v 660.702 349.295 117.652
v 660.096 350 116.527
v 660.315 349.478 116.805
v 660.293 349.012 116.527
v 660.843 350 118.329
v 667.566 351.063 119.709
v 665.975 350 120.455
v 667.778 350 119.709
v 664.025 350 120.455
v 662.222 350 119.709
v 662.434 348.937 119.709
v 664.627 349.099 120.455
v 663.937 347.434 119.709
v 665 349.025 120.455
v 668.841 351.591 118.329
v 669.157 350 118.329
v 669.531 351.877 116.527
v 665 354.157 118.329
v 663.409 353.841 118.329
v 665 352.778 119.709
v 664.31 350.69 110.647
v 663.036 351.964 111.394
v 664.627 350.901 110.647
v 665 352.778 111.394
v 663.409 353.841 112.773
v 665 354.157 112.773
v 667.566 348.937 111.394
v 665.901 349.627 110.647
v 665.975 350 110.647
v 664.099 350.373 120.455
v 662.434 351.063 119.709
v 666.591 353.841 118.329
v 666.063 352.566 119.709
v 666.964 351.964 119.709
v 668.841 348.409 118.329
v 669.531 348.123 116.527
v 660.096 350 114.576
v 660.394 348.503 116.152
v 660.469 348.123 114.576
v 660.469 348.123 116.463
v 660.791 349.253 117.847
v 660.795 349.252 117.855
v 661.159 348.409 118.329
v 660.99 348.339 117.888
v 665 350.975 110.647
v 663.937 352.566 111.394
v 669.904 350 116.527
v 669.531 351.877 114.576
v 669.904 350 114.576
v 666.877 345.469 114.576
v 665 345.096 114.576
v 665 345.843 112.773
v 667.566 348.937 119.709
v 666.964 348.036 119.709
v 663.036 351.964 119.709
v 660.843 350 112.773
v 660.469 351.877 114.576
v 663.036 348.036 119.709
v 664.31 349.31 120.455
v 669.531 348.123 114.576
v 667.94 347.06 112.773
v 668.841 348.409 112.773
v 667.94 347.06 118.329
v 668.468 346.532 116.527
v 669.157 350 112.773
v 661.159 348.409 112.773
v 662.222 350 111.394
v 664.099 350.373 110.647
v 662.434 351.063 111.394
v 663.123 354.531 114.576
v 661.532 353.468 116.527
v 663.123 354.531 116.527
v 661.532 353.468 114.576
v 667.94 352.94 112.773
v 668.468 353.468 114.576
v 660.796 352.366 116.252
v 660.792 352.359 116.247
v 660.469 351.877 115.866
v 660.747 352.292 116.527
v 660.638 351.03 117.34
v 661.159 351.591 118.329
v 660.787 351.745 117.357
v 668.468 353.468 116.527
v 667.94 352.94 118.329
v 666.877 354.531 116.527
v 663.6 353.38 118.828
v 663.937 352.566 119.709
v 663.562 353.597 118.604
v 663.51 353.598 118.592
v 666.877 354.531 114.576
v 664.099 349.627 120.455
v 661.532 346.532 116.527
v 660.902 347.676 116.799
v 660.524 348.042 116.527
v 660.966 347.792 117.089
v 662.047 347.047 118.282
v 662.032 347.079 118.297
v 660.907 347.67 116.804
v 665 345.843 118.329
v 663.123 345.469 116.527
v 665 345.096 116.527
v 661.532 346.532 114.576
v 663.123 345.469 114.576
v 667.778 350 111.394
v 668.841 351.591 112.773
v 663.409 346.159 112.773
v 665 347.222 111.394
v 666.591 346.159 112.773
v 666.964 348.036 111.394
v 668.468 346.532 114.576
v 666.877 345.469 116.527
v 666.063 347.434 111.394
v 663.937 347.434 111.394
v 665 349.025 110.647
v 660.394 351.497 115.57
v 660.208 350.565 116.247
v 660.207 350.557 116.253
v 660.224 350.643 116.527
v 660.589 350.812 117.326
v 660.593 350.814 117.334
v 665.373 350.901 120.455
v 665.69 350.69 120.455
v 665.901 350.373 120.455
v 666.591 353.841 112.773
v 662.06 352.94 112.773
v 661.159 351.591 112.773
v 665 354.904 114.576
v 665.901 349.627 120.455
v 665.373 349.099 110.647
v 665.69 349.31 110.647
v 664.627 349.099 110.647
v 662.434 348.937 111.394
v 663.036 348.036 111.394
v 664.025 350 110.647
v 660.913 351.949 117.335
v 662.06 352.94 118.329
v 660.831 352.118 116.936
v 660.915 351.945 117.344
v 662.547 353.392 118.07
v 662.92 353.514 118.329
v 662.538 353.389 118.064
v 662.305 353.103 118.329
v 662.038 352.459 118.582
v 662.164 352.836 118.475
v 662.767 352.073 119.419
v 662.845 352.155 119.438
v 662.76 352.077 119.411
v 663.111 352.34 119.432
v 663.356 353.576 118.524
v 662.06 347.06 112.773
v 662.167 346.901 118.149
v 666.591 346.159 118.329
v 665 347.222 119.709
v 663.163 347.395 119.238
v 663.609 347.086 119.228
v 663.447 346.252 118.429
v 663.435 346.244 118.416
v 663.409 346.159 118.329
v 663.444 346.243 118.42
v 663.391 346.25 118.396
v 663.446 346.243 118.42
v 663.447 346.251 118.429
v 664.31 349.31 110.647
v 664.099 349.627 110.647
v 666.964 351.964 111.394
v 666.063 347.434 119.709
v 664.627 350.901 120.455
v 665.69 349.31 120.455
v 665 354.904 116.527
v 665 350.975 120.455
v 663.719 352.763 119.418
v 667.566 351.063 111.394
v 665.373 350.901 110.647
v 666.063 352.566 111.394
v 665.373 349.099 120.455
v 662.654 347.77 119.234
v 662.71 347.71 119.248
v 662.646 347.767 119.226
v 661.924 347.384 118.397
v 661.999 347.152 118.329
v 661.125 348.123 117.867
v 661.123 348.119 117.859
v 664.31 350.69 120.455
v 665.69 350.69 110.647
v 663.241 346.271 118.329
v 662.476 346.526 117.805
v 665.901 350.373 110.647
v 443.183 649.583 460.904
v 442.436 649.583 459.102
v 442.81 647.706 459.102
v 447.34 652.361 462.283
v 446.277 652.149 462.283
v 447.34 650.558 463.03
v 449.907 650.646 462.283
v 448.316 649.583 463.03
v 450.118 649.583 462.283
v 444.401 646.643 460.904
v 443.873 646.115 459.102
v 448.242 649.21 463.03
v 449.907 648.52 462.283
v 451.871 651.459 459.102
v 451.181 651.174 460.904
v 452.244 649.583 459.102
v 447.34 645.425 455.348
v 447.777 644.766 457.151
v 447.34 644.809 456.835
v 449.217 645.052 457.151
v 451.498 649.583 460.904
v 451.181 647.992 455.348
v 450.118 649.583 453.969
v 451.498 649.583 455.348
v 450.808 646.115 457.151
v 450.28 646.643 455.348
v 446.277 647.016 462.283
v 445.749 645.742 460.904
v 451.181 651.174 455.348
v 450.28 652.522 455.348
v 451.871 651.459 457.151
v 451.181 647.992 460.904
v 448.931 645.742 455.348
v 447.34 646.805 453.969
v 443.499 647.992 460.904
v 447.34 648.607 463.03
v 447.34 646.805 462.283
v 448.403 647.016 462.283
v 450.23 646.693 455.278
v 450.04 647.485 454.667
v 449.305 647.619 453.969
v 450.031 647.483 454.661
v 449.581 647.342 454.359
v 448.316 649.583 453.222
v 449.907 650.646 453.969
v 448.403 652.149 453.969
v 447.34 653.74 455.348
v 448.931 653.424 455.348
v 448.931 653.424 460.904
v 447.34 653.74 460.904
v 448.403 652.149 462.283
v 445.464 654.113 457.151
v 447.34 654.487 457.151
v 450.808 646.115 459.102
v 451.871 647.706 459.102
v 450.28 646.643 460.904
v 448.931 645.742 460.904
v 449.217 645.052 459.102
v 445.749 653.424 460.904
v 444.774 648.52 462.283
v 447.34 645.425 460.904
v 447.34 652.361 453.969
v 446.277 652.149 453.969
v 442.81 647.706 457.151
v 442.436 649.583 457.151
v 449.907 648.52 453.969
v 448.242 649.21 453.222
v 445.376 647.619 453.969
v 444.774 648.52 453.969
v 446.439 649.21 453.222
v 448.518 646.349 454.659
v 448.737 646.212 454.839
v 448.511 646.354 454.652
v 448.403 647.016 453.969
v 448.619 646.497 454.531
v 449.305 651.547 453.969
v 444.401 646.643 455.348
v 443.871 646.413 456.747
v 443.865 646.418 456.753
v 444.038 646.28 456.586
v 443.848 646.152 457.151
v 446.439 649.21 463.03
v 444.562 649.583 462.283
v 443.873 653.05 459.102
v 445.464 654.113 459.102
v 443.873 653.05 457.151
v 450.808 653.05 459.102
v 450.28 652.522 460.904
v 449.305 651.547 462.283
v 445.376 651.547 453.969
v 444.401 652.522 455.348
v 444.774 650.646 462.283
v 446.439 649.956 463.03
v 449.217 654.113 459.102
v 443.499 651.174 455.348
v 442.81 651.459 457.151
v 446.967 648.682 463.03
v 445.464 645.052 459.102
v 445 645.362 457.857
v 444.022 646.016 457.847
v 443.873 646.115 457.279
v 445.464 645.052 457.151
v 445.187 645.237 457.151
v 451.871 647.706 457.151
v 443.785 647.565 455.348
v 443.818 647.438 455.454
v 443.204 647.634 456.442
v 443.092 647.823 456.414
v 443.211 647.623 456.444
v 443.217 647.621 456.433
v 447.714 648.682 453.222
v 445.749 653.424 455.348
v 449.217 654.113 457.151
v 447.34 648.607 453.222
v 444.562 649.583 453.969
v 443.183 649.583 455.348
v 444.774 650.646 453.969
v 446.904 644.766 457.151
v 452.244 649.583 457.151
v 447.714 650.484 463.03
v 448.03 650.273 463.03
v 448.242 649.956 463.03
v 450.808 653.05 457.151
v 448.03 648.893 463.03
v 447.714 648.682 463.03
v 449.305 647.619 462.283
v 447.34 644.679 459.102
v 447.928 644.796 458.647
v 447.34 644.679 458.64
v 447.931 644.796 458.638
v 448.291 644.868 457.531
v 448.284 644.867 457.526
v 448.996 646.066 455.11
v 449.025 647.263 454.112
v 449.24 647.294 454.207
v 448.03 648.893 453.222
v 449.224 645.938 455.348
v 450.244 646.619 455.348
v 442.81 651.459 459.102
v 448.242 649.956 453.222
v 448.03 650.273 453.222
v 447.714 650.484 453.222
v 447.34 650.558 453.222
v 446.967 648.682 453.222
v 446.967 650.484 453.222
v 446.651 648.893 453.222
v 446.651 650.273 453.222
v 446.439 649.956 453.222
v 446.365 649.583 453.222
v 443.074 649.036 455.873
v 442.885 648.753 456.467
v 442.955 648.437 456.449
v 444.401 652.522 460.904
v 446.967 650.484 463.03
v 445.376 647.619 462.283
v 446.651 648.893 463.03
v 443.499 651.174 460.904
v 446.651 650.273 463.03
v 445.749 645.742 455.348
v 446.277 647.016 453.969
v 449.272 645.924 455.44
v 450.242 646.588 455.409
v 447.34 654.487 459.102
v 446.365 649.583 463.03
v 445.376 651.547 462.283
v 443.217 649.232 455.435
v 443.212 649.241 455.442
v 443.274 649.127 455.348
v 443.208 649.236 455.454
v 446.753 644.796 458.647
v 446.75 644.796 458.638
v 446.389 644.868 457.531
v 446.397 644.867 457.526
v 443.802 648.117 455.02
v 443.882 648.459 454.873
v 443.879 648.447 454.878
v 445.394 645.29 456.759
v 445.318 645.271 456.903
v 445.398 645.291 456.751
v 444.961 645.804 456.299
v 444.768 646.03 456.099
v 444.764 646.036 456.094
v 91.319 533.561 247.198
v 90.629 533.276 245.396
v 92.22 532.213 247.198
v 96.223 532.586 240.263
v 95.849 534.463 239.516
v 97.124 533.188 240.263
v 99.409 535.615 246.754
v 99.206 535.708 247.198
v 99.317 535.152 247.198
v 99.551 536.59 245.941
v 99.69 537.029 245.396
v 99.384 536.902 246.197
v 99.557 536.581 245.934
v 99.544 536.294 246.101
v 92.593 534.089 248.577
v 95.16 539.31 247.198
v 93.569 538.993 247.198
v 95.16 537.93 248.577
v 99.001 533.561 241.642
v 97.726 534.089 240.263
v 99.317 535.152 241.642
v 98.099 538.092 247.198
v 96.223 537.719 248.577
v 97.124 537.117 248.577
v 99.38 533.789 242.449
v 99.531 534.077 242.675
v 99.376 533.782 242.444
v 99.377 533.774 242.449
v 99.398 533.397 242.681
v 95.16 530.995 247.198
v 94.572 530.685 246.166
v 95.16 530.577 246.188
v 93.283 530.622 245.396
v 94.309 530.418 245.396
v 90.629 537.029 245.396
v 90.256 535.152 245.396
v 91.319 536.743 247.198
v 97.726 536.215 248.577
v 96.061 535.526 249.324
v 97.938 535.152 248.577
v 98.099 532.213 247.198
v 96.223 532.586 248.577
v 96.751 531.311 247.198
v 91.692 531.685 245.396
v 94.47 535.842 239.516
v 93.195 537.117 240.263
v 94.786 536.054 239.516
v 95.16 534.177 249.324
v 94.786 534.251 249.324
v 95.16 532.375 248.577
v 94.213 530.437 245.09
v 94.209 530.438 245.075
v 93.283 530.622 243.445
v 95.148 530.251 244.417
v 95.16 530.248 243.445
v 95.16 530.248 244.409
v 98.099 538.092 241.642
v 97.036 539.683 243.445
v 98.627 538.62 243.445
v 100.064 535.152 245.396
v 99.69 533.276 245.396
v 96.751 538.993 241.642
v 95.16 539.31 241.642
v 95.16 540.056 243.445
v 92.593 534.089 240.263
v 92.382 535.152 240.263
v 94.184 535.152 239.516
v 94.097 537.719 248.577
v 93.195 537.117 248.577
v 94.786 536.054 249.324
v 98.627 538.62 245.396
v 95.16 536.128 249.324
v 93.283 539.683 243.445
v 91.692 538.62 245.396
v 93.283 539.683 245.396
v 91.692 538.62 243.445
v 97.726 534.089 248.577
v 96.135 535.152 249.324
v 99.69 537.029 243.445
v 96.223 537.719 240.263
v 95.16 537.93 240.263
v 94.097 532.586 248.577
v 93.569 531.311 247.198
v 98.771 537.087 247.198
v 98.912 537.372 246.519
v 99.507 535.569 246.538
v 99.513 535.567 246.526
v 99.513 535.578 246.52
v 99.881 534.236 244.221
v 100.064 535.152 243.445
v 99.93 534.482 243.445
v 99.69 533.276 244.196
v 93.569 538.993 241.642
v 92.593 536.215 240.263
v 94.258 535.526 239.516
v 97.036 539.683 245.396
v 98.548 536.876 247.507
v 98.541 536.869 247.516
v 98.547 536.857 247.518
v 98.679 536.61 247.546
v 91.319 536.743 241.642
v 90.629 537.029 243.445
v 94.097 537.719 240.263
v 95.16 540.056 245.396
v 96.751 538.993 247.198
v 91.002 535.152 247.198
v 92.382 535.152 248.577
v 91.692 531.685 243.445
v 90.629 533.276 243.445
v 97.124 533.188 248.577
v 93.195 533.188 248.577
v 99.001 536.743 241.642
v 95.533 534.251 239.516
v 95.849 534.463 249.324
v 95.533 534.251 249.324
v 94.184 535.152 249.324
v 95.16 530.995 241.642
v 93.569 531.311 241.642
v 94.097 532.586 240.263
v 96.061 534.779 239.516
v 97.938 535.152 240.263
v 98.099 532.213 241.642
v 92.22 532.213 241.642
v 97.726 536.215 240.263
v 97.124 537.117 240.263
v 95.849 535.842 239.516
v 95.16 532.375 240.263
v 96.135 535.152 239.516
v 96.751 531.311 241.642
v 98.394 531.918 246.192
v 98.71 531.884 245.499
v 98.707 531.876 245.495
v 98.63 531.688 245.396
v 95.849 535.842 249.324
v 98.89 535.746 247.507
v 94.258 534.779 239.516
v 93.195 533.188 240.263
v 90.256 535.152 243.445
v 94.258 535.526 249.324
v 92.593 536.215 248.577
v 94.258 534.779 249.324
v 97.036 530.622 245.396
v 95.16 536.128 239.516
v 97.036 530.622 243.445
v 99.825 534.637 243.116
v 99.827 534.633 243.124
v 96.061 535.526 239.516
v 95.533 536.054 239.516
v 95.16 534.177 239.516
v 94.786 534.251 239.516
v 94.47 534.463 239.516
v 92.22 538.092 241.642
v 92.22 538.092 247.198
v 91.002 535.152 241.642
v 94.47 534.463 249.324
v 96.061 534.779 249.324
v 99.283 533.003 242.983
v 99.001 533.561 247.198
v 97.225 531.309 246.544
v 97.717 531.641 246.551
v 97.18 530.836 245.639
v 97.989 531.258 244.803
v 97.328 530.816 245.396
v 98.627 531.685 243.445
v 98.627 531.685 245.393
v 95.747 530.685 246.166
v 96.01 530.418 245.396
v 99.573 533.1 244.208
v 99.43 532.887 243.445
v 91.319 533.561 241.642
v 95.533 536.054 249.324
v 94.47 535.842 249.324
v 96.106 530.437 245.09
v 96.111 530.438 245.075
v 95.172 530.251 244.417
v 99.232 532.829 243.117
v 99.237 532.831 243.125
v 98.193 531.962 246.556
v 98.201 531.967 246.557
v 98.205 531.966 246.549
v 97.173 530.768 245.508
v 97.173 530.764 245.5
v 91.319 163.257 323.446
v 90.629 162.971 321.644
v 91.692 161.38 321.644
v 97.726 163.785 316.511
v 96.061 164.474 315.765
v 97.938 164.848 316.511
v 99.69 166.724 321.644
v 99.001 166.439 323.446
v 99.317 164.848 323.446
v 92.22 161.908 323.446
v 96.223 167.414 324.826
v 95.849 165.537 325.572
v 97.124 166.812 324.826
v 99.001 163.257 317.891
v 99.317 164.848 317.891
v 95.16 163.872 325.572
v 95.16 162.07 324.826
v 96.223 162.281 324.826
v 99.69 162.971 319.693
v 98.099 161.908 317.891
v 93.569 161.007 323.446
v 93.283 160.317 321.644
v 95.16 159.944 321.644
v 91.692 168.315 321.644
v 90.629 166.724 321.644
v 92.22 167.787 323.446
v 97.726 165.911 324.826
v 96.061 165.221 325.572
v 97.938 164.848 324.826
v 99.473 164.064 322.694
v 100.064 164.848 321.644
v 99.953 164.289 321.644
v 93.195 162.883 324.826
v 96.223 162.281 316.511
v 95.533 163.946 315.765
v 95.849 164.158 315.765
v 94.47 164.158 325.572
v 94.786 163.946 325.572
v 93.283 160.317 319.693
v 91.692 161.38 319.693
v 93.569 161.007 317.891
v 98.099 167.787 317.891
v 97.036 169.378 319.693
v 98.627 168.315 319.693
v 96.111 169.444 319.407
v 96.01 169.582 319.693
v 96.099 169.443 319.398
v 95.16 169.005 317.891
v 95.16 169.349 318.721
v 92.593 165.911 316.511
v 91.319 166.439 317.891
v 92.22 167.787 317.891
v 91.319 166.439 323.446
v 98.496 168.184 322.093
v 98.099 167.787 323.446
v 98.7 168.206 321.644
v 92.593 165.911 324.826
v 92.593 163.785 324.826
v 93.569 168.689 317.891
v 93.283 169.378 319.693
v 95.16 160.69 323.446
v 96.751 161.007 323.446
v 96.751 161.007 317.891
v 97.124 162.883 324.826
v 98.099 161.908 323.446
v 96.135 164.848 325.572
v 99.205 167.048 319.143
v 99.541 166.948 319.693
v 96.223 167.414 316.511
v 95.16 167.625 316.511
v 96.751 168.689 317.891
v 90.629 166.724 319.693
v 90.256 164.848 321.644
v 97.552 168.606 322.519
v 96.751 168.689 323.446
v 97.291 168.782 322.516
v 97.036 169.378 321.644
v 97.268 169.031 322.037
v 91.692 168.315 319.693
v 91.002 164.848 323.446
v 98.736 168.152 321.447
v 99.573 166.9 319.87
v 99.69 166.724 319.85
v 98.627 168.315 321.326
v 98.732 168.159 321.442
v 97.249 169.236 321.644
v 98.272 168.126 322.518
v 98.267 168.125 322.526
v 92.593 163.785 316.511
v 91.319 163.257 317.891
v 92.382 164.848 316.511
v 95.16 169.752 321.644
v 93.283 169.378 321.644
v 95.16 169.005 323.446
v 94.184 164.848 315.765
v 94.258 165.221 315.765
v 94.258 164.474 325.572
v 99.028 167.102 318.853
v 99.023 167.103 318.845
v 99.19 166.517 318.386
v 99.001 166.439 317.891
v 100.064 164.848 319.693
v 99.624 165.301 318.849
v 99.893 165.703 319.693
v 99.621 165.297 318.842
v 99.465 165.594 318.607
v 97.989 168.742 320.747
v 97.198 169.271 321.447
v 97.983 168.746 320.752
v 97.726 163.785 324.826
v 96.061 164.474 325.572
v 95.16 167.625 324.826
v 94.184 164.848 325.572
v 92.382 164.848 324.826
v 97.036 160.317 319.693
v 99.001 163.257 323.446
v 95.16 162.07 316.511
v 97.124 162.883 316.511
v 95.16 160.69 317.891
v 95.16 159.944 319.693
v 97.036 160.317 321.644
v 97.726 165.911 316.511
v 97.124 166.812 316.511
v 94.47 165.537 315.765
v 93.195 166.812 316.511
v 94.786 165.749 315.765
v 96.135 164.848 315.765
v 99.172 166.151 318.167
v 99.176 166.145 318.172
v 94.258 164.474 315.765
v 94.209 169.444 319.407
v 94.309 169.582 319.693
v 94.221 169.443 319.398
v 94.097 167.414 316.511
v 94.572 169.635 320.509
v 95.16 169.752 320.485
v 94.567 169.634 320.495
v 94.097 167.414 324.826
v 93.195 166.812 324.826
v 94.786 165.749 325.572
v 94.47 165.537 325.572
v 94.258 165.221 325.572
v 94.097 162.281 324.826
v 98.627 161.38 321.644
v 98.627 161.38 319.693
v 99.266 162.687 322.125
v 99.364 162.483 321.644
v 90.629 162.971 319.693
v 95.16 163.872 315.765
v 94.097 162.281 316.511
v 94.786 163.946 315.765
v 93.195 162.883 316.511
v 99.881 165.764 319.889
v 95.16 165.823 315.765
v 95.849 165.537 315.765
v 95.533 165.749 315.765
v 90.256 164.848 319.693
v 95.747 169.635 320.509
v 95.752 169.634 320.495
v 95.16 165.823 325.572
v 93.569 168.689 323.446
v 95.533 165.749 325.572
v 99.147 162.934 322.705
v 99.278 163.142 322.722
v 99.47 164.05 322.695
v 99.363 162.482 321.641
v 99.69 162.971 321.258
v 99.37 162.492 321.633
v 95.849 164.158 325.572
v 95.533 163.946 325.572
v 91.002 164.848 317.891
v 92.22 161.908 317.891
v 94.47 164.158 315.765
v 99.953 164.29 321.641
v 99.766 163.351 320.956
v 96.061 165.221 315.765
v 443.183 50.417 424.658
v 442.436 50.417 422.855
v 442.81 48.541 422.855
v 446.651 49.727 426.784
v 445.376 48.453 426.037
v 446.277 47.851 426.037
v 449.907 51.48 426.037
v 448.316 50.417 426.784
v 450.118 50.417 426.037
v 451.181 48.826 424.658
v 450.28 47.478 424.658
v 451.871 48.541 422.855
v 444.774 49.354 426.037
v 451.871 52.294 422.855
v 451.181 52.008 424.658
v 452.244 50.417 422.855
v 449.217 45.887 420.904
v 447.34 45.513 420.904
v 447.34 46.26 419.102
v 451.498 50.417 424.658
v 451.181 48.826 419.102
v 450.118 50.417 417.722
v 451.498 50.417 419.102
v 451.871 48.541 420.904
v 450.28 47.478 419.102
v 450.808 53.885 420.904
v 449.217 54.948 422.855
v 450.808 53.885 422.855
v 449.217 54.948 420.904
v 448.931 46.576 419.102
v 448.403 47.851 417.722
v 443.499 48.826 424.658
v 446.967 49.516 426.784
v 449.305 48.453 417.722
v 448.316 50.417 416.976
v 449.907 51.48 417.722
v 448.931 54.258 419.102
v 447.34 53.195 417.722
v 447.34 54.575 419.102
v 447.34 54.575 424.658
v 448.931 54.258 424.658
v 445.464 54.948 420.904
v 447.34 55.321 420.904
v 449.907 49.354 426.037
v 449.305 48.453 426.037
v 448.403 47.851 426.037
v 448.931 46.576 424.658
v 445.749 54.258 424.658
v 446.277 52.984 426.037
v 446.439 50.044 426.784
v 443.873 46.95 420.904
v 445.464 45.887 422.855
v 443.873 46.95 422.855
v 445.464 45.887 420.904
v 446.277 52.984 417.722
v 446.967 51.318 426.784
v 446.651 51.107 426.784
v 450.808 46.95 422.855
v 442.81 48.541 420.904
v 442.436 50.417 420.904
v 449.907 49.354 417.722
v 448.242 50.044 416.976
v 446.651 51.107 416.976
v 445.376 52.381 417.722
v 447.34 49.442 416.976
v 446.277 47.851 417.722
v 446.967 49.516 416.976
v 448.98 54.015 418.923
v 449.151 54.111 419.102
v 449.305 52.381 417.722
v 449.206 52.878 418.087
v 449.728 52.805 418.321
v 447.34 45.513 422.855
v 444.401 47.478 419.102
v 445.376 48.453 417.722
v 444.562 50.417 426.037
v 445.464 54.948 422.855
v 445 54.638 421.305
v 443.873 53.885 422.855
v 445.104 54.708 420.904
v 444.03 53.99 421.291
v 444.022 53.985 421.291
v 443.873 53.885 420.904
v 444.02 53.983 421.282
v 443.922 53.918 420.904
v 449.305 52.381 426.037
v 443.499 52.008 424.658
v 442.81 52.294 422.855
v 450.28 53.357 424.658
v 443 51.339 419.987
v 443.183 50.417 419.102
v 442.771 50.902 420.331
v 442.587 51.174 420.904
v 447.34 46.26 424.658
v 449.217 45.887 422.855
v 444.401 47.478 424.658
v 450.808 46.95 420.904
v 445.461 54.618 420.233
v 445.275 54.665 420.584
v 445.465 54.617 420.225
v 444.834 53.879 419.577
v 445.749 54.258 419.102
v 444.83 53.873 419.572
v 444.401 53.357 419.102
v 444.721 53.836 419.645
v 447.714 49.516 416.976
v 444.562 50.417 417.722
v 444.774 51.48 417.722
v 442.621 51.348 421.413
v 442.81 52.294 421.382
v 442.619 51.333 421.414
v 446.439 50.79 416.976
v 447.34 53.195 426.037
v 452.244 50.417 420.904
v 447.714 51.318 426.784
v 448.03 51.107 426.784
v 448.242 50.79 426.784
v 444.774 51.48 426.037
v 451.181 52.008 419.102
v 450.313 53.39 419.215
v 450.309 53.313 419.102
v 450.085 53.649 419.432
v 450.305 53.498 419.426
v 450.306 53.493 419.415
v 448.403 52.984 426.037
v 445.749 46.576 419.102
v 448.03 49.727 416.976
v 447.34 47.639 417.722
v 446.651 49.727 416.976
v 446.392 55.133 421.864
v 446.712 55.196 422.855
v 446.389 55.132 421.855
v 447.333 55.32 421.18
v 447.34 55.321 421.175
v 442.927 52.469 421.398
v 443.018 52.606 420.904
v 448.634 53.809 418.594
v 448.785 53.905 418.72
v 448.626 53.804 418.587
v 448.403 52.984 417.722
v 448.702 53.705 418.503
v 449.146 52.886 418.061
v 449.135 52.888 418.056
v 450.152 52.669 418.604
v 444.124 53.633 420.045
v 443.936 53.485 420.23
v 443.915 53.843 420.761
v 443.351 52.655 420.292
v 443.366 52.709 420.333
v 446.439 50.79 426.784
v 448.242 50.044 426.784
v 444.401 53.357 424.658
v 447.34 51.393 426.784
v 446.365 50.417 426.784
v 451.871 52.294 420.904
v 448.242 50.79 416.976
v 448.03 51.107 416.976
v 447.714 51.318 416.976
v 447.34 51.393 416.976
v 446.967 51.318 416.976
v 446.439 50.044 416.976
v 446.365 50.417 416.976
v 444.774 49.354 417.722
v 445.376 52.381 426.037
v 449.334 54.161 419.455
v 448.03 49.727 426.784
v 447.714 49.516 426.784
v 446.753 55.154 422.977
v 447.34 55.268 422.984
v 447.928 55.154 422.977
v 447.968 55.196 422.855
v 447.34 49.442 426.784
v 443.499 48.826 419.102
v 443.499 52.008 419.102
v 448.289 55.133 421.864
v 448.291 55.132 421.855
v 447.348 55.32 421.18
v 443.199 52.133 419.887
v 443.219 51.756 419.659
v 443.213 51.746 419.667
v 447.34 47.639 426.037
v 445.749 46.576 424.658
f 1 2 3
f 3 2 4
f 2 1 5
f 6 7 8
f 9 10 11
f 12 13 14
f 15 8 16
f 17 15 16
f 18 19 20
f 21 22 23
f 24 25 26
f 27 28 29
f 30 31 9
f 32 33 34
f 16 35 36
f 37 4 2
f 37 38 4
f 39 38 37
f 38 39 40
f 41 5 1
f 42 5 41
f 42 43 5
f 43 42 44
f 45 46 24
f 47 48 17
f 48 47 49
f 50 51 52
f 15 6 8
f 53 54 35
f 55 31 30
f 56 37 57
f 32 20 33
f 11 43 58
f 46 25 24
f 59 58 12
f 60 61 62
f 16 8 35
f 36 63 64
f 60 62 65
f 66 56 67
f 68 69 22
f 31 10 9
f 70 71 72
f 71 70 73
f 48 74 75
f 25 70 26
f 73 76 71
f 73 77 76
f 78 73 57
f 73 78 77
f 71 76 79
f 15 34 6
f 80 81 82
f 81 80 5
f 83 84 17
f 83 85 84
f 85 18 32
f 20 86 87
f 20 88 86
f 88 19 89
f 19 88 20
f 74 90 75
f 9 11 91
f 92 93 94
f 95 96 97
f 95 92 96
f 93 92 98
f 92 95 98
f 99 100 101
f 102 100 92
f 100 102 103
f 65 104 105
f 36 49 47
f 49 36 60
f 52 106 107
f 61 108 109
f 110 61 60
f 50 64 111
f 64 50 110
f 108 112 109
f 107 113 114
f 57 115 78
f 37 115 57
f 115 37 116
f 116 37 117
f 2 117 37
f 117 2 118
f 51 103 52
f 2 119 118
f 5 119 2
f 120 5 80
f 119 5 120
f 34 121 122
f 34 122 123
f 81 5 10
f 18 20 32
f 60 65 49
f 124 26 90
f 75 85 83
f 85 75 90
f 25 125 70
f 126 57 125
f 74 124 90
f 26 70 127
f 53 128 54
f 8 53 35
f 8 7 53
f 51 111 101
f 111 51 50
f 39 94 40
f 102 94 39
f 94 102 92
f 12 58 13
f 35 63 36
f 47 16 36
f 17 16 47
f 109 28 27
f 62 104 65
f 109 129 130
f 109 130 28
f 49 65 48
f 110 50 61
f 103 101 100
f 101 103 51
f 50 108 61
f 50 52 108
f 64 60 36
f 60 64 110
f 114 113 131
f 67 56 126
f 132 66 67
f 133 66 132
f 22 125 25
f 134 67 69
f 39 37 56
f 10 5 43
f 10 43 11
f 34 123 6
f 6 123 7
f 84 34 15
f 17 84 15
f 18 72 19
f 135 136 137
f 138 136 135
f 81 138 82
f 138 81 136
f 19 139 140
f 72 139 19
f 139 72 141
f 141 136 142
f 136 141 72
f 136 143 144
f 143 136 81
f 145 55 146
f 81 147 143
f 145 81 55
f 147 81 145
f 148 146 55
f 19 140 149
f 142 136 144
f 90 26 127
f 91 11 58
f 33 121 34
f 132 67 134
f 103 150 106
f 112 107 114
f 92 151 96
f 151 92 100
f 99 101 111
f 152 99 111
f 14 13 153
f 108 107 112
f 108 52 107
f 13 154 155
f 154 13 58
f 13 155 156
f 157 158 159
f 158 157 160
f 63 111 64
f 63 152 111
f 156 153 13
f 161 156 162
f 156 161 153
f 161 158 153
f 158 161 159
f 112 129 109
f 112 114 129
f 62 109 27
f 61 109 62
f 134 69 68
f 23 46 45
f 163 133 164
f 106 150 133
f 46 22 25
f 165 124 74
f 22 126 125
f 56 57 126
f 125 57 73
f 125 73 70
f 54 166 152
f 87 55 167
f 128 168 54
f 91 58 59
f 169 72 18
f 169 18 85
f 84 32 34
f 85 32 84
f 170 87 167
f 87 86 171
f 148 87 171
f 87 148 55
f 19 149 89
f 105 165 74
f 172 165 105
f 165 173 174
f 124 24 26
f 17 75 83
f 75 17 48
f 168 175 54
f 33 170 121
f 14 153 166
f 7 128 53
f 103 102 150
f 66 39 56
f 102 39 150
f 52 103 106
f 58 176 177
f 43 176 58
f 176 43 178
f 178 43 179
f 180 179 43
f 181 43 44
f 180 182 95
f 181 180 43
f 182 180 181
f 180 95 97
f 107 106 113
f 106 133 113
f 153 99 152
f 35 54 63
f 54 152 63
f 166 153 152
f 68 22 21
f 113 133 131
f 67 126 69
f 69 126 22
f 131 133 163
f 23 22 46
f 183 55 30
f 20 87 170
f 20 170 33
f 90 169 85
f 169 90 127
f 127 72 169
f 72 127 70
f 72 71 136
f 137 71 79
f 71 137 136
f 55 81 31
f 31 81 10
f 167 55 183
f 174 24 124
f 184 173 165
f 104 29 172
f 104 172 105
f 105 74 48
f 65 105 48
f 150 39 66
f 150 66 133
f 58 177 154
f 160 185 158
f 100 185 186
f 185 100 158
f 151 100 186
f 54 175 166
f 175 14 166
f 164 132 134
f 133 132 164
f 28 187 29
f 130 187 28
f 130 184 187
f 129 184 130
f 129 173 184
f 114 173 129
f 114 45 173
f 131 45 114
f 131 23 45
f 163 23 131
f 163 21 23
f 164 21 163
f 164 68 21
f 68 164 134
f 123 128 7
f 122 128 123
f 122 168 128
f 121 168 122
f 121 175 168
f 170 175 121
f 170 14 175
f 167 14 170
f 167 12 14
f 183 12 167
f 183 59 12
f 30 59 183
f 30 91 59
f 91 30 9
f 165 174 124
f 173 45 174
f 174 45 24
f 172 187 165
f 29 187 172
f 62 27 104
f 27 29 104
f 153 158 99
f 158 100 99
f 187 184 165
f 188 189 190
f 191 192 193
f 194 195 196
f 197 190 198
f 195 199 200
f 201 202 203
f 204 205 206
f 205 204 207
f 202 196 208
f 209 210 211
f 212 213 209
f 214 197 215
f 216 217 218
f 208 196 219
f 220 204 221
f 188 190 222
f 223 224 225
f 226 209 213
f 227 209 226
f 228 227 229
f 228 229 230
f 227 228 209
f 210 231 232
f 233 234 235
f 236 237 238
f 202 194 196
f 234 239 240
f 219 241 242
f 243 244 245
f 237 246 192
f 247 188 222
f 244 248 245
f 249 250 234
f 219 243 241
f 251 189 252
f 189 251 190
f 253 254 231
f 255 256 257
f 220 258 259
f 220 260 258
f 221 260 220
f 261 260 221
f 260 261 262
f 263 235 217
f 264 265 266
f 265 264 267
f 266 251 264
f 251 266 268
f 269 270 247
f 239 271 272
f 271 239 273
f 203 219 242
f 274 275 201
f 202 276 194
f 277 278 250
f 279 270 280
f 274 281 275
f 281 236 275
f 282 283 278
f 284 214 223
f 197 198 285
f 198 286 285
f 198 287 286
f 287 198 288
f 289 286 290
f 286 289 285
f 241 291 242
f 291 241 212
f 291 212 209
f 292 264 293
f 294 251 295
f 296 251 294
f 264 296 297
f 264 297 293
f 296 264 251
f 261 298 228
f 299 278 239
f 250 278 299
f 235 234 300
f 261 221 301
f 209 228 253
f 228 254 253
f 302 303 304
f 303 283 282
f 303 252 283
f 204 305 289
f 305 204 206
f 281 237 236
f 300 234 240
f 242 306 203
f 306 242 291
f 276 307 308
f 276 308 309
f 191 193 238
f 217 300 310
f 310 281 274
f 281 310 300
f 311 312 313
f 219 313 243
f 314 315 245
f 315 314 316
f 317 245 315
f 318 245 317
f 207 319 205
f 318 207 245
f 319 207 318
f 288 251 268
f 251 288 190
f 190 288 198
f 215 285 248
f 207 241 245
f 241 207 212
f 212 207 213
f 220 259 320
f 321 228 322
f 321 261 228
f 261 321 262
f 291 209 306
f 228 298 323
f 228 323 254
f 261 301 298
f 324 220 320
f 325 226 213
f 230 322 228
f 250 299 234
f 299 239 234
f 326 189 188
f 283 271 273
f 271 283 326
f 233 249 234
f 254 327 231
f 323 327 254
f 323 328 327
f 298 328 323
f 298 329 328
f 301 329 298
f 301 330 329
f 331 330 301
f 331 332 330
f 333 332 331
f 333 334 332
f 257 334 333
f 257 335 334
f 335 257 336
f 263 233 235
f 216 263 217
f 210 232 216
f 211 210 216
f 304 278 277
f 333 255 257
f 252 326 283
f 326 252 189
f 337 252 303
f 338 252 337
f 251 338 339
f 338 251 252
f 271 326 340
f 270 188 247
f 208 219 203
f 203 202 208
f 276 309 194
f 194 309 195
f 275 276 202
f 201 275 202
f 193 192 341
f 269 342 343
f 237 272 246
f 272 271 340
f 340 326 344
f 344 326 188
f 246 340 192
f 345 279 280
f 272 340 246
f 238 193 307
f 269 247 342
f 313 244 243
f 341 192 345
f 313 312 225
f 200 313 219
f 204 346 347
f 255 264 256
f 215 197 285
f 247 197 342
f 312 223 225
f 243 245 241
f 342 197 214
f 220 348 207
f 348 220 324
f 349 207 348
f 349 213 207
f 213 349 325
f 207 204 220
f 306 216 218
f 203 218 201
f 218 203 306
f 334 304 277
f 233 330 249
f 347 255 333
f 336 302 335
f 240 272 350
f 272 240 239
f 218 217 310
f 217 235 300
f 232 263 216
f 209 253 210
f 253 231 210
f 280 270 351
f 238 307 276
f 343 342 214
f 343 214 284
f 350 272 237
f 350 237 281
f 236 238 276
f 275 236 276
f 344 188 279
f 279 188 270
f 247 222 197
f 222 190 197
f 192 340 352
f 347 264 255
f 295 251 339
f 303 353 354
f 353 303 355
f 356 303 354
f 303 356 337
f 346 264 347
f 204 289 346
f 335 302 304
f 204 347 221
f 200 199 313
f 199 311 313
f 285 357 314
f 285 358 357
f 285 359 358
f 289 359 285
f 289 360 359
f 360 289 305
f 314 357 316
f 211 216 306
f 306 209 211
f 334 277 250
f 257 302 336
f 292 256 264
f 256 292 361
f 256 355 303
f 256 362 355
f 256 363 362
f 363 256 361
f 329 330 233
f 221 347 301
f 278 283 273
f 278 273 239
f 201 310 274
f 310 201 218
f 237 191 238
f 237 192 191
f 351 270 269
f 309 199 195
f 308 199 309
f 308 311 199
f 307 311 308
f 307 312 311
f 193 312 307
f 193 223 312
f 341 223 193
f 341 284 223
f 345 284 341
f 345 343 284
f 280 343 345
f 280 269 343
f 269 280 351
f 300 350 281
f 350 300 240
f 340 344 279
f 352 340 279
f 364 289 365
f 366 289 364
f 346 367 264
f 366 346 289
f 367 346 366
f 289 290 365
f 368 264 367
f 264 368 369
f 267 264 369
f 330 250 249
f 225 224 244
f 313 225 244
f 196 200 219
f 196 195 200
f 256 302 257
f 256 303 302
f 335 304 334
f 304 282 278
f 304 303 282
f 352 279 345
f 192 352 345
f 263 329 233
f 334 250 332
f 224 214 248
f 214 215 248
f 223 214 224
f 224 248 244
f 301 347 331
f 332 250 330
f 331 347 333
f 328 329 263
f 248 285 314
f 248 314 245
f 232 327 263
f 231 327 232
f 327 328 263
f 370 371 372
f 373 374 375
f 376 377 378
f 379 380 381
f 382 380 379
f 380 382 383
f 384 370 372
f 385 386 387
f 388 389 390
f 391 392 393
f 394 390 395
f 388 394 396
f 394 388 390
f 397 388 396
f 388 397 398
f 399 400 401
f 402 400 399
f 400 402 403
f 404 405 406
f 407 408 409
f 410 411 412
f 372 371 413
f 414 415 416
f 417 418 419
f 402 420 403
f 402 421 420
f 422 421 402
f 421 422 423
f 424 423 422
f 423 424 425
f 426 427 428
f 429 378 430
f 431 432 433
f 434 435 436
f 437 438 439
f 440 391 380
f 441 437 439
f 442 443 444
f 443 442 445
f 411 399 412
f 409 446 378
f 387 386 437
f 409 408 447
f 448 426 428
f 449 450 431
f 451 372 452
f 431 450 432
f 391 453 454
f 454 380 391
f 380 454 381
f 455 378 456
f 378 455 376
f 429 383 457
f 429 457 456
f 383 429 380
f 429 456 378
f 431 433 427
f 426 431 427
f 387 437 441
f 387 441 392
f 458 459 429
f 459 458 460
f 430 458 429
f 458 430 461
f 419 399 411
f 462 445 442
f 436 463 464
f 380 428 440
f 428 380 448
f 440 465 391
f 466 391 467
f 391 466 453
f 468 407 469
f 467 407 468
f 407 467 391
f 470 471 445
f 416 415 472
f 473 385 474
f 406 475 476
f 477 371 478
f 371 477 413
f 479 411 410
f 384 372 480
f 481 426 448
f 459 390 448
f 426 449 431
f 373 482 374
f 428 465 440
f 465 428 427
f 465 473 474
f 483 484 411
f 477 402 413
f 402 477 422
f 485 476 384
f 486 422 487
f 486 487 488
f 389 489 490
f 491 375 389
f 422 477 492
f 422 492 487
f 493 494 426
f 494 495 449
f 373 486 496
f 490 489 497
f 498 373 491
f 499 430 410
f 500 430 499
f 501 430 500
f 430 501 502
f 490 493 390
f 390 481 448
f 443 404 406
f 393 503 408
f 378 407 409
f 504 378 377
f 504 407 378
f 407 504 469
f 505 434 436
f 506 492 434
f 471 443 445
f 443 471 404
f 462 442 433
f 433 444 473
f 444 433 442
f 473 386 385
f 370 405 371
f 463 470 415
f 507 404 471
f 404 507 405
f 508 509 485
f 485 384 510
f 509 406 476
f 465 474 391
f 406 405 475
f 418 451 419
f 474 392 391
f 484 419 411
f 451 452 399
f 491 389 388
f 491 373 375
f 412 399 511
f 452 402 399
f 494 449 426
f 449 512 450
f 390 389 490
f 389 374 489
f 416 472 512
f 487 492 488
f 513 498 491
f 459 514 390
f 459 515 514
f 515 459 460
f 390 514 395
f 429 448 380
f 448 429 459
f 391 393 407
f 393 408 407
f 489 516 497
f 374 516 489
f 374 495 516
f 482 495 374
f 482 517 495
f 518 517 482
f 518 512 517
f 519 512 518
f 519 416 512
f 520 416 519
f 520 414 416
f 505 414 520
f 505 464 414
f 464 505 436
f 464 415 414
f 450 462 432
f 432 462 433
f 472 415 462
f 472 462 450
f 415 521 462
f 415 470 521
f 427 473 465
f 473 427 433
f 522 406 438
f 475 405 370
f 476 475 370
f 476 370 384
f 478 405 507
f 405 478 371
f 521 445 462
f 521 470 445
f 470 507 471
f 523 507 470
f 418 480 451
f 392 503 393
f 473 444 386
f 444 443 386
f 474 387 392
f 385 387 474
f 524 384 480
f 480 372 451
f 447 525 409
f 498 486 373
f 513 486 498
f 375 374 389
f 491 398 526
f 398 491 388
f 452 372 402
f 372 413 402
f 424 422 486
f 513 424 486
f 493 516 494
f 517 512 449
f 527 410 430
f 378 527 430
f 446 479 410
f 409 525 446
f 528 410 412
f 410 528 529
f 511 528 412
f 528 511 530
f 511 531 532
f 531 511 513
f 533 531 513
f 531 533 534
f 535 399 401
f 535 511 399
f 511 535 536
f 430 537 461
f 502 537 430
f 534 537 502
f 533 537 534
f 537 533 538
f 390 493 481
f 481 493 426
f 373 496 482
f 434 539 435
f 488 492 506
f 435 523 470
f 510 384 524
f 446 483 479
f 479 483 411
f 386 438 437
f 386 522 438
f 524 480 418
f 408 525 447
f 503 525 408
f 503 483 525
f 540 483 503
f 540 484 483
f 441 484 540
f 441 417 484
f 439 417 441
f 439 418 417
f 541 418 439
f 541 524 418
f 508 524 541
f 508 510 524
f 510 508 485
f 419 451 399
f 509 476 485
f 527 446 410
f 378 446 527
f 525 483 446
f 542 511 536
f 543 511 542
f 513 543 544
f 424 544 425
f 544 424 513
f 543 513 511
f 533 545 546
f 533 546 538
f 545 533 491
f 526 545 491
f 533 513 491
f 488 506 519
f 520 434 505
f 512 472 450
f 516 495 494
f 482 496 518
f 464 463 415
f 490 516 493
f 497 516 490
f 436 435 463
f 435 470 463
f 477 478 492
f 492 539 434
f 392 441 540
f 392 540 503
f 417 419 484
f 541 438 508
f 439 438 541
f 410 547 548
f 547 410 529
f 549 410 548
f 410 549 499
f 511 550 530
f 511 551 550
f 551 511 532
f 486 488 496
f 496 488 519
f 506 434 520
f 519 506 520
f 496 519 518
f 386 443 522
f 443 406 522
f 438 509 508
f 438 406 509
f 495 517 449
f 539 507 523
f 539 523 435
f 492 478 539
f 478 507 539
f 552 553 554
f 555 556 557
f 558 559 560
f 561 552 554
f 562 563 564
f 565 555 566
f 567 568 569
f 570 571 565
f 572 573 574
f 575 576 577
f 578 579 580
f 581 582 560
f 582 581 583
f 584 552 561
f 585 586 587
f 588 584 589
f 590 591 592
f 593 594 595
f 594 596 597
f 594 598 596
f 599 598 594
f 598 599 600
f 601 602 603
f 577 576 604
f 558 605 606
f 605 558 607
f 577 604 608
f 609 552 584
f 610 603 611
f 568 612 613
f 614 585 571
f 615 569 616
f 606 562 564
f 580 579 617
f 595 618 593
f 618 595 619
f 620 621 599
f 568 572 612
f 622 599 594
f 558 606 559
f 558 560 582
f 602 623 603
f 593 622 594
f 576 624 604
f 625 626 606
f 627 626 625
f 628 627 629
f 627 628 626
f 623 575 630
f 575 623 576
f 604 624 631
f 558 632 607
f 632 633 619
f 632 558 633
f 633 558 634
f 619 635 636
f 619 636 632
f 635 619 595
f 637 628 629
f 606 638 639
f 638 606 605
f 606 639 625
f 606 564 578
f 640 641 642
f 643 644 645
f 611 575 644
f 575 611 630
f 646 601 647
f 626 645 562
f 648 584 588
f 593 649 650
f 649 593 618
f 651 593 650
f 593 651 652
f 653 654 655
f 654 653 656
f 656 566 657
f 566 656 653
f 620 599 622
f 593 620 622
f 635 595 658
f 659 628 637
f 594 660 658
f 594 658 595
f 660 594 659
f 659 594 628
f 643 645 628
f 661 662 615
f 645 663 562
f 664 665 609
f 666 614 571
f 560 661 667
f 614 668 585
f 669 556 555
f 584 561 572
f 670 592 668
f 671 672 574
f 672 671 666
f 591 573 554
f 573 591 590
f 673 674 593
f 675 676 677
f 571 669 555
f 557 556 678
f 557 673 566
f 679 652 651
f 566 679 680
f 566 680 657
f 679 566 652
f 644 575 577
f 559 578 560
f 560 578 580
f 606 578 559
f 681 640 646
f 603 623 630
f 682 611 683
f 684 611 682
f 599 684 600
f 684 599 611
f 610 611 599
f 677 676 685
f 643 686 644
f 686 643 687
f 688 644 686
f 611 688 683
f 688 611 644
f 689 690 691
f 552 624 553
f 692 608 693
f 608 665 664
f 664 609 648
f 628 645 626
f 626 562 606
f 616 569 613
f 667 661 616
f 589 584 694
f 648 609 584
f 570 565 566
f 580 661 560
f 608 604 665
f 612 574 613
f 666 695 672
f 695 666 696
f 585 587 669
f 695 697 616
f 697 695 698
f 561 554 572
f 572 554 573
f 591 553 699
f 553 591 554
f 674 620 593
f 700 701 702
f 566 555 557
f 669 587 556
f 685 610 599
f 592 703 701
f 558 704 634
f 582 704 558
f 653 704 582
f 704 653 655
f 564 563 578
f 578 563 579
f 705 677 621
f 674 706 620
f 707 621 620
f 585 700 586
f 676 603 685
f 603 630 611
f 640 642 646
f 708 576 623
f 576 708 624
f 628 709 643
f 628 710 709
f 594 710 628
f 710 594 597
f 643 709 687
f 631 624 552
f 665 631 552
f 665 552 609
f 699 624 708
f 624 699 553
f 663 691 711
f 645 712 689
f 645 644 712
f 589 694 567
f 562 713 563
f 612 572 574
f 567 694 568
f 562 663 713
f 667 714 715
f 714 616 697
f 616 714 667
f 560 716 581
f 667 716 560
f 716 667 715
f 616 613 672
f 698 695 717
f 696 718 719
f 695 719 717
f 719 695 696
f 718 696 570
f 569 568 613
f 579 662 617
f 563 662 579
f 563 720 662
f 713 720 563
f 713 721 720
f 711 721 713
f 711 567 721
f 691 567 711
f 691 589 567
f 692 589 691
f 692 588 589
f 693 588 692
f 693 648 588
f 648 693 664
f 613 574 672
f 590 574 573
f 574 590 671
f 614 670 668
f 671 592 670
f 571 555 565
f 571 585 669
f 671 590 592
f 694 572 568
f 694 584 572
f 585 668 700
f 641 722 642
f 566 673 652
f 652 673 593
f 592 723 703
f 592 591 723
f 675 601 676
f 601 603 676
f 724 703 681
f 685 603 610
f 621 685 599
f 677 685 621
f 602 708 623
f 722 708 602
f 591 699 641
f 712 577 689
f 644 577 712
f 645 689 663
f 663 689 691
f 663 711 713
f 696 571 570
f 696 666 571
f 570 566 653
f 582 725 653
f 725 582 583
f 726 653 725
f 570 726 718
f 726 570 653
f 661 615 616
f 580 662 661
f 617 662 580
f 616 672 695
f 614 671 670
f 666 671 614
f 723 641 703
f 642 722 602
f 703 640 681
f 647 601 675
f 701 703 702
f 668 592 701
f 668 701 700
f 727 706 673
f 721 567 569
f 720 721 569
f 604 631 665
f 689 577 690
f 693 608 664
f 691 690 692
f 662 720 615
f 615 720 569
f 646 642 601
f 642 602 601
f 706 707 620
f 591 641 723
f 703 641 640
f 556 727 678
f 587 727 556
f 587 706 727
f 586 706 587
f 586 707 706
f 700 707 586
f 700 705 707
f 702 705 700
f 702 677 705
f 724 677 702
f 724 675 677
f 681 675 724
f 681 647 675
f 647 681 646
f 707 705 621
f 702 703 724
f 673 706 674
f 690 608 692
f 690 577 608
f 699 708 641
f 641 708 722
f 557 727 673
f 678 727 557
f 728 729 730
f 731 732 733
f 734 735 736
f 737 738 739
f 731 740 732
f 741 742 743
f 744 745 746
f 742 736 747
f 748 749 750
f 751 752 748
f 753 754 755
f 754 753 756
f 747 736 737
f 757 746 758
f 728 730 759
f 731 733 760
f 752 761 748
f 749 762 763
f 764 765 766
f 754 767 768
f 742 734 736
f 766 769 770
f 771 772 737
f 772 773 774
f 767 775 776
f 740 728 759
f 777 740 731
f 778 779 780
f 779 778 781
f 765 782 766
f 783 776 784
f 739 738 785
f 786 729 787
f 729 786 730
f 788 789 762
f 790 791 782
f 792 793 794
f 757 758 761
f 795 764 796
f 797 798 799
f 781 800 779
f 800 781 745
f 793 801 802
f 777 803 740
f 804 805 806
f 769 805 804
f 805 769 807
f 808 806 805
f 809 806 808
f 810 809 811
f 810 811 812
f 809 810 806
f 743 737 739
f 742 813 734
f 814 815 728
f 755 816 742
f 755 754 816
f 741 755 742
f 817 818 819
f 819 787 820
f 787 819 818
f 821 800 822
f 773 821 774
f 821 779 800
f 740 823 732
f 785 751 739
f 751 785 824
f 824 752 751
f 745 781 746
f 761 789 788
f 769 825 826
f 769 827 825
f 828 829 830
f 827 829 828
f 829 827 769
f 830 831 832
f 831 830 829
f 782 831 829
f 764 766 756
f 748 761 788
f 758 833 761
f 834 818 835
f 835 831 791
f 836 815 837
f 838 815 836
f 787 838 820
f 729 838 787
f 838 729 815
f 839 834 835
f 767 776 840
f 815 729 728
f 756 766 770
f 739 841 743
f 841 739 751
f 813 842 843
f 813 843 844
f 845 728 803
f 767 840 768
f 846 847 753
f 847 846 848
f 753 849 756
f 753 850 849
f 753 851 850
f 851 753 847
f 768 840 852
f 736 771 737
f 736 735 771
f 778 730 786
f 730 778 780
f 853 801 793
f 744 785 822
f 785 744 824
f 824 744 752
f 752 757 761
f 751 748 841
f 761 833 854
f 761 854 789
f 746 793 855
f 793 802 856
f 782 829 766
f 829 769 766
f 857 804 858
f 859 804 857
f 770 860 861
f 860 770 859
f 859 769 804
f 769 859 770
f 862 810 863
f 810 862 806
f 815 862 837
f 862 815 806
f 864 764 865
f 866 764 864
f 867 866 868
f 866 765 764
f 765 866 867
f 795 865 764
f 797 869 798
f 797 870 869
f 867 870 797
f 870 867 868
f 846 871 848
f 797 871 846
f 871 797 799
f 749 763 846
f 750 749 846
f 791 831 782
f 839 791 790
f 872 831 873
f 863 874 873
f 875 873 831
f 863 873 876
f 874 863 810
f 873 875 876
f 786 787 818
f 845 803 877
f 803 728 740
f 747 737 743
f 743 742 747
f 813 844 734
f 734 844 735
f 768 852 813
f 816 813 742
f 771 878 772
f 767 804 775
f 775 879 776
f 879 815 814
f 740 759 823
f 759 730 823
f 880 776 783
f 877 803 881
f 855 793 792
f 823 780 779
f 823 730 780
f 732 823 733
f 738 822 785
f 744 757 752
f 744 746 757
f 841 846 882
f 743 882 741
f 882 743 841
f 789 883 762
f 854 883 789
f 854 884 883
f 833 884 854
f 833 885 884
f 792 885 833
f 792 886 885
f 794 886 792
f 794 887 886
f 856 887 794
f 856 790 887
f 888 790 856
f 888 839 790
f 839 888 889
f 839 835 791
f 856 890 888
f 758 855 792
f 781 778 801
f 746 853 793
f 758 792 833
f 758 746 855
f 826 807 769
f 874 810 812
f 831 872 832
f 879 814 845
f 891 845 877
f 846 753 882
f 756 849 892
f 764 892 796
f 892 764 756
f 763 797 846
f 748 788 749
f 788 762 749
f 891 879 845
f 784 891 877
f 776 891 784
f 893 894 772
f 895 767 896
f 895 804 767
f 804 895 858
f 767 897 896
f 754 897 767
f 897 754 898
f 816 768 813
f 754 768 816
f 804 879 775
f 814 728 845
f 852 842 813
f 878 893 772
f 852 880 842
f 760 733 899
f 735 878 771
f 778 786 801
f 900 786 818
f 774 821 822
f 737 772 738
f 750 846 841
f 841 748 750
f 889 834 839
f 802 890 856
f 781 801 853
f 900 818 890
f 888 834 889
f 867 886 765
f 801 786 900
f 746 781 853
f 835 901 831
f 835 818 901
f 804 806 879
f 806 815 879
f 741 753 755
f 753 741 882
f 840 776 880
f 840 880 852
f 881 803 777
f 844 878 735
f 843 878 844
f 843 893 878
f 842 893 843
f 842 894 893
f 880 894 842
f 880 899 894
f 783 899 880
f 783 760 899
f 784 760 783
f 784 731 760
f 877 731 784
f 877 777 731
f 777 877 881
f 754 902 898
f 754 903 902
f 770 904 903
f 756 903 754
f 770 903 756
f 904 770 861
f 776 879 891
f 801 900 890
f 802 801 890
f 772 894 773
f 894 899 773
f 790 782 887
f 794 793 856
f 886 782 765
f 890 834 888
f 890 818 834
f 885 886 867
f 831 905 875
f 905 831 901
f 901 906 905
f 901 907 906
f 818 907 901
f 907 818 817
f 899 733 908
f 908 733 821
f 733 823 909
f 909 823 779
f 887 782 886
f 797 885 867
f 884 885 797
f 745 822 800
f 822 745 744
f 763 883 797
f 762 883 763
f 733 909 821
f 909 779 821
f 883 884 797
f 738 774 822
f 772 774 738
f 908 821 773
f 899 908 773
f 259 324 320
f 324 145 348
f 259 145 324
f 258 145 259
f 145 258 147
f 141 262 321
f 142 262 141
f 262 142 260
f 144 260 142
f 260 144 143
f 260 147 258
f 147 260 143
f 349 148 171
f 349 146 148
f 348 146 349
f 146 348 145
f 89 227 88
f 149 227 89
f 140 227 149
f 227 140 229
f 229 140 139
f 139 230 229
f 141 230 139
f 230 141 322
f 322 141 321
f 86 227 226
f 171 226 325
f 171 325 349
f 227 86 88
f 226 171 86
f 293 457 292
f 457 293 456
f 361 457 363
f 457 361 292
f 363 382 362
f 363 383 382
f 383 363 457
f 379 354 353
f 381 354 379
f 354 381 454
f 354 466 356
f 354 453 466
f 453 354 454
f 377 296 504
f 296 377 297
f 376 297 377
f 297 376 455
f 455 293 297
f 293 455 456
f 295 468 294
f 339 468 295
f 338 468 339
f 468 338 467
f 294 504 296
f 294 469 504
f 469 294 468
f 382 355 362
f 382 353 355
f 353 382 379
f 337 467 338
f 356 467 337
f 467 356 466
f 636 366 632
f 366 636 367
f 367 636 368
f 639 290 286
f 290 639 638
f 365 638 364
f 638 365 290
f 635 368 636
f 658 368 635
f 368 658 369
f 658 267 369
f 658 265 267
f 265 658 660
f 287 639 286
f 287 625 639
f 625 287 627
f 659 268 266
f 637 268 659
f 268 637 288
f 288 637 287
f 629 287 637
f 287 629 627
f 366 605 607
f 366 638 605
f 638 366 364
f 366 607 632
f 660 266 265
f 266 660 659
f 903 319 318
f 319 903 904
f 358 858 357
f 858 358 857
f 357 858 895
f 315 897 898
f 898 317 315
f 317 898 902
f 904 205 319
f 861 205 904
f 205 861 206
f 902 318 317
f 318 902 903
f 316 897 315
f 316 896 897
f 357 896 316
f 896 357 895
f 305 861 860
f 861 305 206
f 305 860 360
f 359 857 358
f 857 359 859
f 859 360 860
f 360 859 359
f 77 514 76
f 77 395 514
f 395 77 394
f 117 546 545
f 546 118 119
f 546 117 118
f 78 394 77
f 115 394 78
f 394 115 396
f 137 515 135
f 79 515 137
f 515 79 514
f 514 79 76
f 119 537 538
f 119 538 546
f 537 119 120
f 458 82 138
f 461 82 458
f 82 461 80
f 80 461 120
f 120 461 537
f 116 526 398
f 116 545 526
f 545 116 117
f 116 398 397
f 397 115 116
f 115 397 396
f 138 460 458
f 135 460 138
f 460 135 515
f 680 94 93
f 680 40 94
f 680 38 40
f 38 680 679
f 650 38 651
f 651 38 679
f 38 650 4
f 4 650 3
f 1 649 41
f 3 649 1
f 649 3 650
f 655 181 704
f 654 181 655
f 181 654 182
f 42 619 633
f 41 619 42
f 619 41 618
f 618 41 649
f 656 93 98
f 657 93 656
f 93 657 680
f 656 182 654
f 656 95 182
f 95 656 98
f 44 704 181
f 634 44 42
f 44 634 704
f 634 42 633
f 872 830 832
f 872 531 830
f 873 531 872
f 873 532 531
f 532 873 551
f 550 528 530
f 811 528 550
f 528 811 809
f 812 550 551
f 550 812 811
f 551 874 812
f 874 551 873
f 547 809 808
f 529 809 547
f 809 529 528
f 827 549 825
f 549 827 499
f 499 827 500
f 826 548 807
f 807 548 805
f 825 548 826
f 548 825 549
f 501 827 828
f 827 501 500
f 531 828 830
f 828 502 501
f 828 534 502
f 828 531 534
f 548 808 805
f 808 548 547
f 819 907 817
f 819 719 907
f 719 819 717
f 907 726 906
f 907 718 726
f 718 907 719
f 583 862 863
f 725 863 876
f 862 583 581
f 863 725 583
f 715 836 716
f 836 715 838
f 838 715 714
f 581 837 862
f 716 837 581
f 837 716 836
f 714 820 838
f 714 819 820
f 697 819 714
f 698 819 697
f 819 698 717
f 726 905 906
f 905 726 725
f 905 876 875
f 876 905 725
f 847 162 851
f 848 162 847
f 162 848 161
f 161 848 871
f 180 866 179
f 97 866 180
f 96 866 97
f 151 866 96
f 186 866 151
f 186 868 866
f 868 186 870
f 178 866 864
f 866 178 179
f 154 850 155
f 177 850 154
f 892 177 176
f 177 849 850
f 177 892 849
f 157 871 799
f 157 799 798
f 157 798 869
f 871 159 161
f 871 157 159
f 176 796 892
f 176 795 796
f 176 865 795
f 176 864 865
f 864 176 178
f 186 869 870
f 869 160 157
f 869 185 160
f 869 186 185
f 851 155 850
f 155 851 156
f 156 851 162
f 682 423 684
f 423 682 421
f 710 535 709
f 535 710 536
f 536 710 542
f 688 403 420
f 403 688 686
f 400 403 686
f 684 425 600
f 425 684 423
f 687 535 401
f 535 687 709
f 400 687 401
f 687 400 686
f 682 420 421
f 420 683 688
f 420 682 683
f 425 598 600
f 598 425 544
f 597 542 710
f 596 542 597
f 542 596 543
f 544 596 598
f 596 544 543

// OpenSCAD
// Define the node renderer.
//  Parameters:
//  n - the index in the nodes table of the node to render
module renderNode(n) {
    translate(nodeCoordinates[n]) sphere(r = 5, center = true);
};

// Define the edge renderer.
//  Parameters:
//  src - the index in the nodes table of the source node
//  dst - the index in the nodes table of the destination node
module renderEdge(src, dst) {

    // Find the source and destination node coordinates.
    srcNode  = nodeCoordinates[src];
    destNode = nodeCoordinates[dst];

    // Find the vector connecting the source and destination node coordinates.
	diff = [destNode[0] - srcNode[0], destNode[1] - srcNode[1], destNode[2] - srcNode[2]];

    // Find the distance between the source and destination node coordinates.
	length = sqrt(pow(diff[0], 2) + pow(diff[1], 2) + pow(diff[2], 2));

    // Move to the starting point.
	translate(diff / 2 + srcNode) {

        // Rotate around the Z axis.
        rotate([0, 0, atan2(diff[1], diff[0])]) {

            // Rotate around the Y axis.
            rotate([0, atan2(sqrt(pow(diff[0], 2) + pow(diff[1], 2)), diff[2]), 0]) {

                // Draw the edge.
                cylinder(h = length, r = 1.0, center = true);

            }

        }

    }

};

// Define the list of node coordinates.
nodeCoordinates = [
[665.0, 350.0, 115.55123658929773], 
[447.3403532281084, 649.5828026329734, 458.12608176178617], 
[95.1596467718916, 535.1523544721291, 244.42013822996074], 
[95.15964677189154, 164.847645527871, 320.6684697845816], 
[447.34035322810837, 50.417197367026574, 421.8797364660057]
];

// Define the list of node identifiers.
nodeIdentifiers = [
[0, 0], 
[1, 1], 
[2, 2], 
[3, 3], 
[4, 4]
];

// Define the list of edges.
edgeIdentifiers = [
[1, 0, 0], 
[2, 0, 1], 
[3, 1, 0], 
[4, 1, 2], 
[5, 1, 3], 
[6, 1, 4], 
[7, 2, 0], 
[8, 3, 0], 
[9, 4, 1], 
[10, 4, 2], 
[11, 4, 3], 
[12, 0, 0], 
[13, 0, 1], 
[14, 1, 0], 
[15, 1, 2], 
[16, 1, 3], 
[17, 1, 4], 
[18, 2, 0], 
[19, 3, 1], 
[20, 3, 3], 
[21, 4, 0], 
[22, 4, 2], 
[23, 1, 2], 
[24, 1, 3], 
[25, 2, 1], 
[26, 2, 4], 
[27, 3, 1], 
[28, 3, 2], 
[29, 3, 3], 
[30, 3, 4], 
[31, 4, 1], 
[32, 4, 4]
];

// Render the network nodes.
for (nodeIndex = [0 : len(nodeCoordinates) - 1] ) {
renderNode(nodeIndex);
};

// Render the network edges.
for (edgeIndex = [0 : len(edgeIdentifiers) - 1] ) {
renderEdge(
    lookup(edgeIdentifiers[edgeIndex][1], nodeIdentifiers),
    lookup(edgeIdentifiers[edgeIndex][2], nodeIdentifiers)
);
};
